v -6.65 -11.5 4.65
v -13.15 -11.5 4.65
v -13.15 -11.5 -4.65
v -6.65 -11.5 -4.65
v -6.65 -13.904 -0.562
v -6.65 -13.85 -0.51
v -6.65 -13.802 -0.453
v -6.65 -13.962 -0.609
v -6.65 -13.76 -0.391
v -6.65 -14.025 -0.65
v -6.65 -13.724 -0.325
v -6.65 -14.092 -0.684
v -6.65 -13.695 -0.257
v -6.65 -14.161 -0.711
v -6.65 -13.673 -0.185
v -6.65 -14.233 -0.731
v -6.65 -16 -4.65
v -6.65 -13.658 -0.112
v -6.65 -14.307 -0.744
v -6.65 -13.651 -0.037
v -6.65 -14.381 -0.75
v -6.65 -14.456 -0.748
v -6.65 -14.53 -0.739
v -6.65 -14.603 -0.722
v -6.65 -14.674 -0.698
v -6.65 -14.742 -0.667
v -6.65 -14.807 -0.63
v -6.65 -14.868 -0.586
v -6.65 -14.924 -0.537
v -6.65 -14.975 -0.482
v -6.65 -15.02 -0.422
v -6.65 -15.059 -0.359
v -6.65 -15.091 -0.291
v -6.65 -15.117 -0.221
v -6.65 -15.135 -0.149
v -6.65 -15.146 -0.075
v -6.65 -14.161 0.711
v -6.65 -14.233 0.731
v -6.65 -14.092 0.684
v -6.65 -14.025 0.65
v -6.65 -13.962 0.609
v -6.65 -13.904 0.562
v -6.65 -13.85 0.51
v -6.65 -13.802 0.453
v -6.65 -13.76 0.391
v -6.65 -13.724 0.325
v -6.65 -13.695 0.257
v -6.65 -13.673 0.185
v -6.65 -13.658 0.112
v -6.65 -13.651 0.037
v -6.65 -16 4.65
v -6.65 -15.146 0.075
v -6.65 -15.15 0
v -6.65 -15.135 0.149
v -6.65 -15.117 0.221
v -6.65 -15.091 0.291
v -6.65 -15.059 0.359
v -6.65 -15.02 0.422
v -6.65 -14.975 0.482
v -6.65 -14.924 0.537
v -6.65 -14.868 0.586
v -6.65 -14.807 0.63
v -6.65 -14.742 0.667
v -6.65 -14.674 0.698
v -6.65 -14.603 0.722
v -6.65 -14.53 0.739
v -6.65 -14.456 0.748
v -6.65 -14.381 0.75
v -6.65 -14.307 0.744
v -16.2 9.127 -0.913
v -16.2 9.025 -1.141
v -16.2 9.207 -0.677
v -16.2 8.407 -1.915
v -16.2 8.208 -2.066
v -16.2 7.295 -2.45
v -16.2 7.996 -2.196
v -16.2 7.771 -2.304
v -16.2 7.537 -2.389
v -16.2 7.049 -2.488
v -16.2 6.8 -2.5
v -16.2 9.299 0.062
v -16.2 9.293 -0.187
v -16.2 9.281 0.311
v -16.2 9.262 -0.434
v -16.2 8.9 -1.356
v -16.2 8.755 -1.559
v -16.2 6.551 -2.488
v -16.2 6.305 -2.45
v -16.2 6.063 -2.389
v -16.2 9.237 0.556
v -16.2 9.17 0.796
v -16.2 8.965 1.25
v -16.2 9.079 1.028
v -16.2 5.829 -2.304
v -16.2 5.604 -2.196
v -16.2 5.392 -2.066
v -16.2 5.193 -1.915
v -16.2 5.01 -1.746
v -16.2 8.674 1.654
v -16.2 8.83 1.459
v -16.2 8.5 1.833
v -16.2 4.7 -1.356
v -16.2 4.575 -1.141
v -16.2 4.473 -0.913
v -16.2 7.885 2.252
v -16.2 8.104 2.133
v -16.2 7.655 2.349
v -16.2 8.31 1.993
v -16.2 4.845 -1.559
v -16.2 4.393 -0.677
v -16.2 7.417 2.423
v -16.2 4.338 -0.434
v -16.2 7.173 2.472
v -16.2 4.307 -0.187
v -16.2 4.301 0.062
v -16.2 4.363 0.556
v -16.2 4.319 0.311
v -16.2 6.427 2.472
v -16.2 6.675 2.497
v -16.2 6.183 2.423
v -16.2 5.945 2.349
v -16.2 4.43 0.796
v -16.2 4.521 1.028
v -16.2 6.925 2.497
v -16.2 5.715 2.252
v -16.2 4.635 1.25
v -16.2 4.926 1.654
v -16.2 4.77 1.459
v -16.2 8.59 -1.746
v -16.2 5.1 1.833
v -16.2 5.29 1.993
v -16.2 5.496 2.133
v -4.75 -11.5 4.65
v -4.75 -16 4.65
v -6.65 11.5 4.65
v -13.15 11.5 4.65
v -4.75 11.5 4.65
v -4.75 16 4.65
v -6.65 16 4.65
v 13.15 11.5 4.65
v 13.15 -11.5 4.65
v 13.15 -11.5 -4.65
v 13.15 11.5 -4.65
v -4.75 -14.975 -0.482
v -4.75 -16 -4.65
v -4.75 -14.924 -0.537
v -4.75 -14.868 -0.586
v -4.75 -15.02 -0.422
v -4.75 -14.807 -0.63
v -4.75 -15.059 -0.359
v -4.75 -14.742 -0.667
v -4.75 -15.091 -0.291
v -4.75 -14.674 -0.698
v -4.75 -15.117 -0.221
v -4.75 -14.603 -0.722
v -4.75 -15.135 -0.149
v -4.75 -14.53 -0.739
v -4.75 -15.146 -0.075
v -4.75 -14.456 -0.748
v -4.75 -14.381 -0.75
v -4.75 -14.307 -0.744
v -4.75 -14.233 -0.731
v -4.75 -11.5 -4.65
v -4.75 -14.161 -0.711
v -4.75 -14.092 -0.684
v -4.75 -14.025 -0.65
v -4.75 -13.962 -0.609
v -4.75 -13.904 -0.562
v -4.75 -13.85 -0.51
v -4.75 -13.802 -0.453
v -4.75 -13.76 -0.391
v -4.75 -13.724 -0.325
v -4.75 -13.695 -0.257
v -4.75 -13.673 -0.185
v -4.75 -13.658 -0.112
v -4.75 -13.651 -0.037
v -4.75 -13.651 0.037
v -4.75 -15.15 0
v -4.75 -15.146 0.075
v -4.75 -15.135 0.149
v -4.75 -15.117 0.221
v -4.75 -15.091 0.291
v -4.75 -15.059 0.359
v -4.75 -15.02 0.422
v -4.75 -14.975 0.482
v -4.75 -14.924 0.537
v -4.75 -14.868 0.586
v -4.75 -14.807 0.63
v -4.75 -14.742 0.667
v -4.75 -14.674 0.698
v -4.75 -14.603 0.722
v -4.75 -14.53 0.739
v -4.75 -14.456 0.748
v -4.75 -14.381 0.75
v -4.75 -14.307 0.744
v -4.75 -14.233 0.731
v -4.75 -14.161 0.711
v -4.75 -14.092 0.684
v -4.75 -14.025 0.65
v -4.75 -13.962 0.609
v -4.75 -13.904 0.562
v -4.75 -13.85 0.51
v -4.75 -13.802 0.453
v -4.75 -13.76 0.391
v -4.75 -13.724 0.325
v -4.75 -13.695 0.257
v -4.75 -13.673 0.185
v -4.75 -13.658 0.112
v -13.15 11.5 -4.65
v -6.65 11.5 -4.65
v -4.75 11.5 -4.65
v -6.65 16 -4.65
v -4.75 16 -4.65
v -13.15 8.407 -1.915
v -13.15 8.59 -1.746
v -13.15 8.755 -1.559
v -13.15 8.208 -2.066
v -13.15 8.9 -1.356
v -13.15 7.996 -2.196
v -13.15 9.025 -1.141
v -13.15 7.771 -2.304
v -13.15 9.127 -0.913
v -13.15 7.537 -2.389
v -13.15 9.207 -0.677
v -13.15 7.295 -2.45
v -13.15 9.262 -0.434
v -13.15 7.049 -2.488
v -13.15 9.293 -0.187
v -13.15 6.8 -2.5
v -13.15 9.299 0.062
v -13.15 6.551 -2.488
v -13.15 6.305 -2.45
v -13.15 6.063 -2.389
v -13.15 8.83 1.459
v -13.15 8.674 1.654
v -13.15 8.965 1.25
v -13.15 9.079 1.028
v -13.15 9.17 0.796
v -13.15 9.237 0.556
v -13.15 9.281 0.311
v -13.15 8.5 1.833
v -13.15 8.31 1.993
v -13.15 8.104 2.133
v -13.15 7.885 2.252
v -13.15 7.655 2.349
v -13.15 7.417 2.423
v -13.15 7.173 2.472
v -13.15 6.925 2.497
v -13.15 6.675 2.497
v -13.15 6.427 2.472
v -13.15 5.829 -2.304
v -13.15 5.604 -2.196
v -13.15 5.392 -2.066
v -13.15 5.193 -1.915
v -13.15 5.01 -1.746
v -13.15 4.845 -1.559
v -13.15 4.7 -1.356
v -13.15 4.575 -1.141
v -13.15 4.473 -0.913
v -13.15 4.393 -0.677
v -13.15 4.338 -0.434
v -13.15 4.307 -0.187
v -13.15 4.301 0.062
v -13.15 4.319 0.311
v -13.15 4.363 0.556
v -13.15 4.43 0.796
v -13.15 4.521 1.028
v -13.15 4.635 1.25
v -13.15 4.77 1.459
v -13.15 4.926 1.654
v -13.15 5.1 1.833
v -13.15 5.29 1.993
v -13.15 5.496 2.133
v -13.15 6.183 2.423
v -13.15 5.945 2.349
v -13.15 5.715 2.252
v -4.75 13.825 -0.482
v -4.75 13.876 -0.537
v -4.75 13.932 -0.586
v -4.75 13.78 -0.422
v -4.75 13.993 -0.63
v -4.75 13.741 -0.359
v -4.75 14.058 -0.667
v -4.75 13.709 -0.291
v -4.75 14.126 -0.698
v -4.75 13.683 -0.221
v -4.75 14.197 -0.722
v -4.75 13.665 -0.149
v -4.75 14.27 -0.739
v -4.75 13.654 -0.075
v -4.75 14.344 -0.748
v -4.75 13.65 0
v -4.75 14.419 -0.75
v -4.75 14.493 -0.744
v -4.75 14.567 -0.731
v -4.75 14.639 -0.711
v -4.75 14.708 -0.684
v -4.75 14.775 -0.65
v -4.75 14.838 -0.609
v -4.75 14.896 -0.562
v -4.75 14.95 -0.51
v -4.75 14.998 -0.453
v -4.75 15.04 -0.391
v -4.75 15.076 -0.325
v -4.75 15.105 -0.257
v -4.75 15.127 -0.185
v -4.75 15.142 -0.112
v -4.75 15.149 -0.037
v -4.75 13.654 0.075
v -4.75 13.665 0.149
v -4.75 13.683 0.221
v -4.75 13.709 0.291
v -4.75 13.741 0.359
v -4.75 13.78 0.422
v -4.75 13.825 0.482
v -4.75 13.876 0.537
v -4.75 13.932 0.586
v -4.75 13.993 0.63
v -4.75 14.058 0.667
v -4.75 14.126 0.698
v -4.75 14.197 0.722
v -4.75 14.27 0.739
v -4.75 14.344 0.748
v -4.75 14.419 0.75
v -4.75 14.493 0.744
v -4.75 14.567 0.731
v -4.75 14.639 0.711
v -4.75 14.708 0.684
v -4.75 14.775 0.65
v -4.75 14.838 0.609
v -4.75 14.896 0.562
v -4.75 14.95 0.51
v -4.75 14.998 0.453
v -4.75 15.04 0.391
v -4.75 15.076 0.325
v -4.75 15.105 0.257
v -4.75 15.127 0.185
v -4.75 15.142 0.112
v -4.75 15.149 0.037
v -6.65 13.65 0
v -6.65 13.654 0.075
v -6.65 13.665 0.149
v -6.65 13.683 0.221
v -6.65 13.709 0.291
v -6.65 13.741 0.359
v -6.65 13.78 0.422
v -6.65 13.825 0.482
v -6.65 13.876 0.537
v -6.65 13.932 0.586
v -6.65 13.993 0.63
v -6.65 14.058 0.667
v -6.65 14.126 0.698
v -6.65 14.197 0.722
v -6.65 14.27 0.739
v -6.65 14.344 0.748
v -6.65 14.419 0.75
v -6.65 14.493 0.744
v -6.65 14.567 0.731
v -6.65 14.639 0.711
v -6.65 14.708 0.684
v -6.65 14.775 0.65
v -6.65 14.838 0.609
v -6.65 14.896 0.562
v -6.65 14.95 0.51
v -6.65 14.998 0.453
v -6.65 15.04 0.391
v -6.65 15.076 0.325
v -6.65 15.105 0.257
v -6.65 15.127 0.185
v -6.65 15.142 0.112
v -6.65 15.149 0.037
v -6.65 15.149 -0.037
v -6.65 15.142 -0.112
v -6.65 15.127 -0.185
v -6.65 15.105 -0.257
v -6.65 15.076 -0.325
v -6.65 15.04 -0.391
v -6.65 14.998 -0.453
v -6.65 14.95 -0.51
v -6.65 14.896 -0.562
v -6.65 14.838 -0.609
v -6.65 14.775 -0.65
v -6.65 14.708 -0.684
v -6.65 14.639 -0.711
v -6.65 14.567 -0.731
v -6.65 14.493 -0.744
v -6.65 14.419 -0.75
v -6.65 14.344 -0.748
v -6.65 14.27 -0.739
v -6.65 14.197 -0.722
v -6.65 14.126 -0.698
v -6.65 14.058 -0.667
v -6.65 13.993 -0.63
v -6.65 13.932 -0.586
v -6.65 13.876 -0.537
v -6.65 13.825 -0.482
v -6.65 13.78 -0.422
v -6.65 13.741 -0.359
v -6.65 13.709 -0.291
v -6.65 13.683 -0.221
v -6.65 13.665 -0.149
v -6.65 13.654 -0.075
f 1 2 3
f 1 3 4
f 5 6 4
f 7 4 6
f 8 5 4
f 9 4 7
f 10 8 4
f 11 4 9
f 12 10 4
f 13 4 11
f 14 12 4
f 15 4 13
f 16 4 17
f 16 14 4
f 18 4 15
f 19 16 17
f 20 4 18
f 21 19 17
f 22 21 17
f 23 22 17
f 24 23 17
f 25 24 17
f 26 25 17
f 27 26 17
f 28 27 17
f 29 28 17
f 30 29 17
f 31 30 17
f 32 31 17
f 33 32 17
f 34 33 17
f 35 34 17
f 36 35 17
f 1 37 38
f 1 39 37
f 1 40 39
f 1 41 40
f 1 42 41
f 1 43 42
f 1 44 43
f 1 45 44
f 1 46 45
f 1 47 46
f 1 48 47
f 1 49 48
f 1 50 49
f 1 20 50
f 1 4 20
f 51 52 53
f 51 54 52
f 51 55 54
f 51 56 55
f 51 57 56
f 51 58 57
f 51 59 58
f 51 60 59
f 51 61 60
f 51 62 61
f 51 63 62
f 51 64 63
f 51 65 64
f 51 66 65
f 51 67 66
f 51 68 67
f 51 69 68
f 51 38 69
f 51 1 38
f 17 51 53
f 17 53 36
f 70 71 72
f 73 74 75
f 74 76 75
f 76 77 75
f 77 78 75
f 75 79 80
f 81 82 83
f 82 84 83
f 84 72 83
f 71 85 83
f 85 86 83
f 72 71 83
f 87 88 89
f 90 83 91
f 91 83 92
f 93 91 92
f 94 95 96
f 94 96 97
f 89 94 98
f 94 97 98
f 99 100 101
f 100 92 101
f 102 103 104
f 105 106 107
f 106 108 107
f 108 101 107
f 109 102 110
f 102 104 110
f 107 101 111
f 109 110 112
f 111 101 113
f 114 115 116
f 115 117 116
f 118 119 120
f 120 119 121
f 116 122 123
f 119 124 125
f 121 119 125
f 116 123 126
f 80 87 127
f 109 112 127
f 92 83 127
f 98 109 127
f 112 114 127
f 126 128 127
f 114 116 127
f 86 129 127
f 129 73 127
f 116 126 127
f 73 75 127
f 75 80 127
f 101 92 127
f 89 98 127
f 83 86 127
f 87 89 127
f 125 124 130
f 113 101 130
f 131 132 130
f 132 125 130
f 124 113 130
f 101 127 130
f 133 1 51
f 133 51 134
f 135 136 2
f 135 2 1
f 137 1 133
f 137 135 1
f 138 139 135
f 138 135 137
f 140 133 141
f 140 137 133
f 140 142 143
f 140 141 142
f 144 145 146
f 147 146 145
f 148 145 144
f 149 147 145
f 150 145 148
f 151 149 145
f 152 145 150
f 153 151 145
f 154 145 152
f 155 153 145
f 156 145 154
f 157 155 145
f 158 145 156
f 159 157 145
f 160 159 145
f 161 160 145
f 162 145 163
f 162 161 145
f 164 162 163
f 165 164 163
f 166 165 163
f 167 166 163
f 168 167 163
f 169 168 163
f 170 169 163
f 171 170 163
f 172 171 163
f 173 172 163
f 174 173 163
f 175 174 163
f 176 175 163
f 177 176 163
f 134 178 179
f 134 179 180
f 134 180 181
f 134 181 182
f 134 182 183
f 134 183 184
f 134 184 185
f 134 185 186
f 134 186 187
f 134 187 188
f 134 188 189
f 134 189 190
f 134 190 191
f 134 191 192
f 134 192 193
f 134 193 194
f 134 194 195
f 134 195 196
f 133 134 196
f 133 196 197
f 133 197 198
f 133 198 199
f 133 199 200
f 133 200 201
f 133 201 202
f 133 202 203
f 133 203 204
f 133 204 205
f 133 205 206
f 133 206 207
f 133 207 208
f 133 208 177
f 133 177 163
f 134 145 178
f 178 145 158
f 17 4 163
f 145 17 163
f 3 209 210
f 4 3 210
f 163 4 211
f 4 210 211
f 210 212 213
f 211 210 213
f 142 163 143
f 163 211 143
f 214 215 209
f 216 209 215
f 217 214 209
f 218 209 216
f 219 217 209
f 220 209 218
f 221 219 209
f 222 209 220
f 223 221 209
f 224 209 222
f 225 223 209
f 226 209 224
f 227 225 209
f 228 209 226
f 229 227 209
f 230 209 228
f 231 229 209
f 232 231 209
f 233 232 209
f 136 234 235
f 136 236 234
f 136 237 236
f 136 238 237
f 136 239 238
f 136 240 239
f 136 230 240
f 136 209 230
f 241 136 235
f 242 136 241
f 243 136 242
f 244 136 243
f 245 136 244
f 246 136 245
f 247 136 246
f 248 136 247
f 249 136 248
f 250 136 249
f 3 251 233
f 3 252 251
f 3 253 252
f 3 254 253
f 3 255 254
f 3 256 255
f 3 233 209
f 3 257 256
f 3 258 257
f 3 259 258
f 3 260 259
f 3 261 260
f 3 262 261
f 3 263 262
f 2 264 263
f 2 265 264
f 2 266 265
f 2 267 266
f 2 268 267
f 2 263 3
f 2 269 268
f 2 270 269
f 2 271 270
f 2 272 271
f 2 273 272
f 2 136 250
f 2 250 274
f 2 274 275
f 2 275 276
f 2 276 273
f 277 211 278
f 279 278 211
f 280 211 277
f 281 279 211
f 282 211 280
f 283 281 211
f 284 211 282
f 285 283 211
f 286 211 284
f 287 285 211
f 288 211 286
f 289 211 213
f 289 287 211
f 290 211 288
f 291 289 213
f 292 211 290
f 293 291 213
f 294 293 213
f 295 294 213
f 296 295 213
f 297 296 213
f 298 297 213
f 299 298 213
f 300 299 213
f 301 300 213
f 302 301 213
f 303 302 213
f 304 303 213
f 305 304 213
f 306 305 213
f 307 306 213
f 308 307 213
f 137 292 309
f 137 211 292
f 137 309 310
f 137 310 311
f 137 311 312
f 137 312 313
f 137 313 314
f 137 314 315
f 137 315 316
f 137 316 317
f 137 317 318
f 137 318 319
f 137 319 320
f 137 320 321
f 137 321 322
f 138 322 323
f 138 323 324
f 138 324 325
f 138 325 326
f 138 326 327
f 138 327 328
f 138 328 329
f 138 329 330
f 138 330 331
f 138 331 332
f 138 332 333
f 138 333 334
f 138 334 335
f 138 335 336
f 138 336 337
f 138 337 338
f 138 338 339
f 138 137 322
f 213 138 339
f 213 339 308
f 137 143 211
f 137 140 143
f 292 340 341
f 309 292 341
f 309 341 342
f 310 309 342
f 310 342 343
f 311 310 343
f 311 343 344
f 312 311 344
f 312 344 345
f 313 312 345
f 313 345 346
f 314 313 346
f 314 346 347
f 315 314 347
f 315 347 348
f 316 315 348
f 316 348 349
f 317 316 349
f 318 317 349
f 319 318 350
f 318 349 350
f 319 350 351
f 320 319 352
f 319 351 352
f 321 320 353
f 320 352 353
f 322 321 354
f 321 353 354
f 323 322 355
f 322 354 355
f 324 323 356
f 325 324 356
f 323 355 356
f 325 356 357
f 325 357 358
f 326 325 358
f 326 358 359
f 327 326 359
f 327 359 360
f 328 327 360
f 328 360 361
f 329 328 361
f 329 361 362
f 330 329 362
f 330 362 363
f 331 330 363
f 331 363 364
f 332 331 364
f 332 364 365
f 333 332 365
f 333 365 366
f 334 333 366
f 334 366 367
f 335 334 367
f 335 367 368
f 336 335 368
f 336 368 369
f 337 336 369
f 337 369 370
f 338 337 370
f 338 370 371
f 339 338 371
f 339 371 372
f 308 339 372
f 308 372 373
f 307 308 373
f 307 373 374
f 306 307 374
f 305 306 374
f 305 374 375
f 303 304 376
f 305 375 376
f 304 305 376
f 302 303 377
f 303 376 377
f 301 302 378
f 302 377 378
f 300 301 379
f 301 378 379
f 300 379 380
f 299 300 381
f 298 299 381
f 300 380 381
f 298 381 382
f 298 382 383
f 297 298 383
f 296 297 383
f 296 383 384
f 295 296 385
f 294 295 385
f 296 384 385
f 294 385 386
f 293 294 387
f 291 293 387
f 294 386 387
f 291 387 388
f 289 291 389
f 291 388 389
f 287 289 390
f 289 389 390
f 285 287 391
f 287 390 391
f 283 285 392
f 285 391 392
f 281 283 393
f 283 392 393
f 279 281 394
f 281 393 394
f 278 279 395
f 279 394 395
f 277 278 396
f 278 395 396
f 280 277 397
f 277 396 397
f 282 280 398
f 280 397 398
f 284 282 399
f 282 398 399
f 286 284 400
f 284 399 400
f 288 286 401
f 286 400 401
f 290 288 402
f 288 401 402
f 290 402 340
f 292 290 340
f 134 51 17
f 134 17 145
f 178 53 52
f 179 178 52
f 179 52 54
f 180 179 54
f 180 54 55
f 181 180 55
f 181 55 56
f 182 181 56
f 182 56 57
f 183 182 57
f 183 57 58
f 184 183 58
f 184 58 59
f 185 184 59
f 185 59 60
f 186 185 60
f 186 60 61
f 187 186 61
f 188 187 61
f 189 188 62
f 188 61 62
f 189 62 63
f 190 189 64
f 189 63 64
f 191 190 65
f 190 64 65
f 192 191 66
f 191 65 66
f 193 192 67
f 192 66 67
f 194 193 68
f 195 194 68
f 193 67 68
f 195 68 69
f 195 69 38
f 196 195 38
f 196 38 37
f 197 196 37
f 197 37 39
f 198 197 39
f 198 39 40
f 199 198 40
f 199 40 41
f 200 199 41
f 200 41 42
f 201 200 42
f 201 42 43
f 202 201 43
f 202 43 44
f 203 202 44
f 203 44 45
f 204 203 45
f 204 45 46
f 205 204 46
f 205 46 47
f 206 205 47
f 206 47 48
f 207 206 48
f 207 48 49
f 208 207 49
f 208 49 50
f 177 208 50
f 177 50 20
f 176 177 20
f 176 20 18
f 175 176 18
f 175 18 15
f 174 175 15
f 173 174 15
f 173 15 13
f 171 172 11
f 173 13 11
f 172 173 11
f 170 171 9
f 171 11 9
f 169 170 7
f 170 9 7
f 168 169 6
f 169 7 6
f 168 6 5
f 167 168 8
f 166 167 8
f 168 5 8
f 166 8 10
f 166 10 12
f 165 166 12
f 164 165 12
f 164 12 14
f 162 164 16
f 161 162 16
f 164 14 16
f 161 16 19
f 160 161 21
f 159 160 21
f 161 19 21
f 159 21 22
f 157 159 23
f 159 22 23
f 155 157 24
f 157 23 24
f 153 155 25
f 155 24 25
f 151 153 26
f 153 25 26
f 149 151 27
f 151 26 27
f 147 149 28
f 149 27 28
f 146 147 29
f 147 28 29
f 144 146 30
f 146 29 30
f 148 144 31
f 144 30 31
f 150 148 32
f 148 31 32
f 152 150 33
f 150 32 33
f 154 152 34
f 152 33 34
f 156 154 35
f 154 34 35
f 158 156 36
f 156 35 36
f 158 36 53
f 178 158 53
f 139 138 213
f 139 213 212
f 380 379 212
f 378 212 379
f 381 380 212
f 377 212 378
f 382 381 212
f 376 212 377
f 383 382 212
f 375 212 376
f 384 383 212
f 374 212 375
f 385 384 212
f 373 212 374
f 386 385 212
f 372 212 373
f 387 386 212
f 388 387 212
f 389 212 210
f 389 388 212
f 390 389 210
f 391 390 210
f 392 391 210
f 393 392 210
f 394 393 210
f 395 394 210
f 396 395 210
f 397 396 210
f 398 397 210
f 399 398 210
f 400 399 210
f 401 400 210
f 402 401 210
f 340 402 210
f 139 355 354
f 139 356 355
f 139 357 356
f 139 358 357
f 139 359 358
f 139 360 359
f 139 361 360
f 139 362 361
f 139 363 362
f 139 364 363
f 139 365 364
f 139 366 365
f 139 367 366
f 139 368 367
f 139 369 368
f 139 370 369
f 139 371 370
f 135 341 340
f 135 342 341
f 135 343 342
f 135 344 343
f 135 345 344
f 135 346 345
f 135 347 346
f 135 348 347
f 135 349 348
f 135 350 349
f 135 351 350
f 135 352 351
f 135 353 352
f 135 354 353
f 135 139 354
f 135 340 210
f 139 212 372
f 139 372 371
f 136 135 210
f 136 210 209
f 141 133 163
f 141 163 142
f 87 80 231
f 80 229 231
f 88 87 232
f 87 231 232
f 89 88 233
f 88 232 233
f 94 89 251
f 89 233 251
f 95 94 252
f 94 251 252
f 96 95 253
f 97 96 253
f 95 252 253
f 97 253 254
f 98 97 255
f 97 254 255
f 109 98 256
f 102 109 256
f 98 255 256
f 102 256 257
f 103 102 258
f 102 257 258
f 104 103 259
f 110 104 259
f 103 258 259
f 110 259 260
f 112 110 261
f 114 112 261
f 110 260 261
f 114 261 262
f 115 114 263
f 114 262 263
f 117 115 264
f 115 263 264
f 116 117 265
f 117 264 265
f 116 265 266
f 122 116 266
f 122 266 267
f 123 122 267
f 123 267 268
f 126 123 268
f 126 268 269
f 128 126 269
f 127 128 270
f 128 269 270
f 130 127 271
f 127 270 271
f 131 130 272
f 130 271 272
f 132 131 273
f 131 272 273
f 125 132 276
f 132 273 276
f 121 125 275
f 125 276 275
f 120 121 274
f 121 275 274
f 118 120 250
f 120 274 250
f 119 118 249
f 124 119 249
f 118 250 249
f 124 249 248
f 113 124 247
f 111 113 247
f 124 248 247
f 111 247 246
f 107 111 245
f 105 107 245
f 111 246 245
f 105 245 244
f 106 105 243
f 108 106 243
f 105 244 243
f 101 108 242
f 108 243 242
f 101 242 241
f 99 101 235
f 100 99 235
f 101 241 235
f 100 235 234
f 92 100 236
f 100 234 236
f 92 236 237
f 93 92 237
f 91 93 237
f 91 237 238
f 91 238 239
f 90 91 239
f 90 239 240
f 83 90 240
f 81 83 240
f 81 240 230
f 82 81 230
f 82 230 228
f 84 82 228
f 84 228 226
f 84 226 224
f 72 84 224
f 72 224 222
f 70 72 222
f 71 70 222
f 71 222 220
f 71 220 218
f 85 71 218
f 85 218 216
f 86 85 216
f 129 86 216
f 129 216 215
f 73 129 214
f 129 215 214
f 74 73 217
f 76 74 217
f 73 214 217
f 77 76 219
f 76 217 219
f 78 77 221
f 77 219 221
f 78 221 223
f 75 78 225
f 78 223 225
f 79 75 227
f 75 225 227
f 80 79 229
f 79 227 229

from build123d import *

# Parameters (mm, degrees)
BOSS_EXTRUDE1_DEPTH = 4.65
SKETCH3_W           = 3.05
SKETCH3_H           = 2.5
SKETCH4_R           = 0.75
CUT_EXTRUDE1_DEPTH  = 10


with BuildPart() as part:
    # Sketch1 → Boss-Extrude1 (new, symmetric)
    with BuildSketch(Plane.XY):
        Polygon((-4.75, 11.5), (-4.75, 16), (-6.65, 16), (-6.65, 11.5), (-13.15, 11.5), (-13.15, -11.5), (-6.65, -11.5), (-6.65, -16), (-4.75, -16), (-4.75, -11.5), (13.15, -11.5), (13.15, 11.5), align=None)
    extrude(amount=BOSS_EXTRUDE1_DEPTH, both=True)

    # Sketch3 → Revolve1 (revolve)
    with BuildSketch(Plane.XY, mode=Mode.PRIVATE) as revolve1_sk:
        with Locations((-14.675, 8.05)):
            Rectangle(SKETCH3_W, SKETCH3_H)
    revolve(revolve1_sk.sketch.rotate(Axis((-13.15, 6.8, 0), (-1, 0, 0)), 90), axis=Axis((-13.15, 6.8, 0), (-1, 0, 0)))

    # Sketch4 → Cut-Extrude1 (cut)
    with BuildSketch(Plane.ZY.offset(6.65)):
        with Locations(Location((0, 14.4, 0), (0, 0, 270))):
            Circle(SKETCH4_R)
        with Locations(Location((0, -14.4, 0), (0, 0, 270))):
            Circle(SKETCH4_R)
    extrude(amount=-CUT_EXTRUDE1_DEPTH, mode=Mode.SUBTRACT)


solid = part.part
